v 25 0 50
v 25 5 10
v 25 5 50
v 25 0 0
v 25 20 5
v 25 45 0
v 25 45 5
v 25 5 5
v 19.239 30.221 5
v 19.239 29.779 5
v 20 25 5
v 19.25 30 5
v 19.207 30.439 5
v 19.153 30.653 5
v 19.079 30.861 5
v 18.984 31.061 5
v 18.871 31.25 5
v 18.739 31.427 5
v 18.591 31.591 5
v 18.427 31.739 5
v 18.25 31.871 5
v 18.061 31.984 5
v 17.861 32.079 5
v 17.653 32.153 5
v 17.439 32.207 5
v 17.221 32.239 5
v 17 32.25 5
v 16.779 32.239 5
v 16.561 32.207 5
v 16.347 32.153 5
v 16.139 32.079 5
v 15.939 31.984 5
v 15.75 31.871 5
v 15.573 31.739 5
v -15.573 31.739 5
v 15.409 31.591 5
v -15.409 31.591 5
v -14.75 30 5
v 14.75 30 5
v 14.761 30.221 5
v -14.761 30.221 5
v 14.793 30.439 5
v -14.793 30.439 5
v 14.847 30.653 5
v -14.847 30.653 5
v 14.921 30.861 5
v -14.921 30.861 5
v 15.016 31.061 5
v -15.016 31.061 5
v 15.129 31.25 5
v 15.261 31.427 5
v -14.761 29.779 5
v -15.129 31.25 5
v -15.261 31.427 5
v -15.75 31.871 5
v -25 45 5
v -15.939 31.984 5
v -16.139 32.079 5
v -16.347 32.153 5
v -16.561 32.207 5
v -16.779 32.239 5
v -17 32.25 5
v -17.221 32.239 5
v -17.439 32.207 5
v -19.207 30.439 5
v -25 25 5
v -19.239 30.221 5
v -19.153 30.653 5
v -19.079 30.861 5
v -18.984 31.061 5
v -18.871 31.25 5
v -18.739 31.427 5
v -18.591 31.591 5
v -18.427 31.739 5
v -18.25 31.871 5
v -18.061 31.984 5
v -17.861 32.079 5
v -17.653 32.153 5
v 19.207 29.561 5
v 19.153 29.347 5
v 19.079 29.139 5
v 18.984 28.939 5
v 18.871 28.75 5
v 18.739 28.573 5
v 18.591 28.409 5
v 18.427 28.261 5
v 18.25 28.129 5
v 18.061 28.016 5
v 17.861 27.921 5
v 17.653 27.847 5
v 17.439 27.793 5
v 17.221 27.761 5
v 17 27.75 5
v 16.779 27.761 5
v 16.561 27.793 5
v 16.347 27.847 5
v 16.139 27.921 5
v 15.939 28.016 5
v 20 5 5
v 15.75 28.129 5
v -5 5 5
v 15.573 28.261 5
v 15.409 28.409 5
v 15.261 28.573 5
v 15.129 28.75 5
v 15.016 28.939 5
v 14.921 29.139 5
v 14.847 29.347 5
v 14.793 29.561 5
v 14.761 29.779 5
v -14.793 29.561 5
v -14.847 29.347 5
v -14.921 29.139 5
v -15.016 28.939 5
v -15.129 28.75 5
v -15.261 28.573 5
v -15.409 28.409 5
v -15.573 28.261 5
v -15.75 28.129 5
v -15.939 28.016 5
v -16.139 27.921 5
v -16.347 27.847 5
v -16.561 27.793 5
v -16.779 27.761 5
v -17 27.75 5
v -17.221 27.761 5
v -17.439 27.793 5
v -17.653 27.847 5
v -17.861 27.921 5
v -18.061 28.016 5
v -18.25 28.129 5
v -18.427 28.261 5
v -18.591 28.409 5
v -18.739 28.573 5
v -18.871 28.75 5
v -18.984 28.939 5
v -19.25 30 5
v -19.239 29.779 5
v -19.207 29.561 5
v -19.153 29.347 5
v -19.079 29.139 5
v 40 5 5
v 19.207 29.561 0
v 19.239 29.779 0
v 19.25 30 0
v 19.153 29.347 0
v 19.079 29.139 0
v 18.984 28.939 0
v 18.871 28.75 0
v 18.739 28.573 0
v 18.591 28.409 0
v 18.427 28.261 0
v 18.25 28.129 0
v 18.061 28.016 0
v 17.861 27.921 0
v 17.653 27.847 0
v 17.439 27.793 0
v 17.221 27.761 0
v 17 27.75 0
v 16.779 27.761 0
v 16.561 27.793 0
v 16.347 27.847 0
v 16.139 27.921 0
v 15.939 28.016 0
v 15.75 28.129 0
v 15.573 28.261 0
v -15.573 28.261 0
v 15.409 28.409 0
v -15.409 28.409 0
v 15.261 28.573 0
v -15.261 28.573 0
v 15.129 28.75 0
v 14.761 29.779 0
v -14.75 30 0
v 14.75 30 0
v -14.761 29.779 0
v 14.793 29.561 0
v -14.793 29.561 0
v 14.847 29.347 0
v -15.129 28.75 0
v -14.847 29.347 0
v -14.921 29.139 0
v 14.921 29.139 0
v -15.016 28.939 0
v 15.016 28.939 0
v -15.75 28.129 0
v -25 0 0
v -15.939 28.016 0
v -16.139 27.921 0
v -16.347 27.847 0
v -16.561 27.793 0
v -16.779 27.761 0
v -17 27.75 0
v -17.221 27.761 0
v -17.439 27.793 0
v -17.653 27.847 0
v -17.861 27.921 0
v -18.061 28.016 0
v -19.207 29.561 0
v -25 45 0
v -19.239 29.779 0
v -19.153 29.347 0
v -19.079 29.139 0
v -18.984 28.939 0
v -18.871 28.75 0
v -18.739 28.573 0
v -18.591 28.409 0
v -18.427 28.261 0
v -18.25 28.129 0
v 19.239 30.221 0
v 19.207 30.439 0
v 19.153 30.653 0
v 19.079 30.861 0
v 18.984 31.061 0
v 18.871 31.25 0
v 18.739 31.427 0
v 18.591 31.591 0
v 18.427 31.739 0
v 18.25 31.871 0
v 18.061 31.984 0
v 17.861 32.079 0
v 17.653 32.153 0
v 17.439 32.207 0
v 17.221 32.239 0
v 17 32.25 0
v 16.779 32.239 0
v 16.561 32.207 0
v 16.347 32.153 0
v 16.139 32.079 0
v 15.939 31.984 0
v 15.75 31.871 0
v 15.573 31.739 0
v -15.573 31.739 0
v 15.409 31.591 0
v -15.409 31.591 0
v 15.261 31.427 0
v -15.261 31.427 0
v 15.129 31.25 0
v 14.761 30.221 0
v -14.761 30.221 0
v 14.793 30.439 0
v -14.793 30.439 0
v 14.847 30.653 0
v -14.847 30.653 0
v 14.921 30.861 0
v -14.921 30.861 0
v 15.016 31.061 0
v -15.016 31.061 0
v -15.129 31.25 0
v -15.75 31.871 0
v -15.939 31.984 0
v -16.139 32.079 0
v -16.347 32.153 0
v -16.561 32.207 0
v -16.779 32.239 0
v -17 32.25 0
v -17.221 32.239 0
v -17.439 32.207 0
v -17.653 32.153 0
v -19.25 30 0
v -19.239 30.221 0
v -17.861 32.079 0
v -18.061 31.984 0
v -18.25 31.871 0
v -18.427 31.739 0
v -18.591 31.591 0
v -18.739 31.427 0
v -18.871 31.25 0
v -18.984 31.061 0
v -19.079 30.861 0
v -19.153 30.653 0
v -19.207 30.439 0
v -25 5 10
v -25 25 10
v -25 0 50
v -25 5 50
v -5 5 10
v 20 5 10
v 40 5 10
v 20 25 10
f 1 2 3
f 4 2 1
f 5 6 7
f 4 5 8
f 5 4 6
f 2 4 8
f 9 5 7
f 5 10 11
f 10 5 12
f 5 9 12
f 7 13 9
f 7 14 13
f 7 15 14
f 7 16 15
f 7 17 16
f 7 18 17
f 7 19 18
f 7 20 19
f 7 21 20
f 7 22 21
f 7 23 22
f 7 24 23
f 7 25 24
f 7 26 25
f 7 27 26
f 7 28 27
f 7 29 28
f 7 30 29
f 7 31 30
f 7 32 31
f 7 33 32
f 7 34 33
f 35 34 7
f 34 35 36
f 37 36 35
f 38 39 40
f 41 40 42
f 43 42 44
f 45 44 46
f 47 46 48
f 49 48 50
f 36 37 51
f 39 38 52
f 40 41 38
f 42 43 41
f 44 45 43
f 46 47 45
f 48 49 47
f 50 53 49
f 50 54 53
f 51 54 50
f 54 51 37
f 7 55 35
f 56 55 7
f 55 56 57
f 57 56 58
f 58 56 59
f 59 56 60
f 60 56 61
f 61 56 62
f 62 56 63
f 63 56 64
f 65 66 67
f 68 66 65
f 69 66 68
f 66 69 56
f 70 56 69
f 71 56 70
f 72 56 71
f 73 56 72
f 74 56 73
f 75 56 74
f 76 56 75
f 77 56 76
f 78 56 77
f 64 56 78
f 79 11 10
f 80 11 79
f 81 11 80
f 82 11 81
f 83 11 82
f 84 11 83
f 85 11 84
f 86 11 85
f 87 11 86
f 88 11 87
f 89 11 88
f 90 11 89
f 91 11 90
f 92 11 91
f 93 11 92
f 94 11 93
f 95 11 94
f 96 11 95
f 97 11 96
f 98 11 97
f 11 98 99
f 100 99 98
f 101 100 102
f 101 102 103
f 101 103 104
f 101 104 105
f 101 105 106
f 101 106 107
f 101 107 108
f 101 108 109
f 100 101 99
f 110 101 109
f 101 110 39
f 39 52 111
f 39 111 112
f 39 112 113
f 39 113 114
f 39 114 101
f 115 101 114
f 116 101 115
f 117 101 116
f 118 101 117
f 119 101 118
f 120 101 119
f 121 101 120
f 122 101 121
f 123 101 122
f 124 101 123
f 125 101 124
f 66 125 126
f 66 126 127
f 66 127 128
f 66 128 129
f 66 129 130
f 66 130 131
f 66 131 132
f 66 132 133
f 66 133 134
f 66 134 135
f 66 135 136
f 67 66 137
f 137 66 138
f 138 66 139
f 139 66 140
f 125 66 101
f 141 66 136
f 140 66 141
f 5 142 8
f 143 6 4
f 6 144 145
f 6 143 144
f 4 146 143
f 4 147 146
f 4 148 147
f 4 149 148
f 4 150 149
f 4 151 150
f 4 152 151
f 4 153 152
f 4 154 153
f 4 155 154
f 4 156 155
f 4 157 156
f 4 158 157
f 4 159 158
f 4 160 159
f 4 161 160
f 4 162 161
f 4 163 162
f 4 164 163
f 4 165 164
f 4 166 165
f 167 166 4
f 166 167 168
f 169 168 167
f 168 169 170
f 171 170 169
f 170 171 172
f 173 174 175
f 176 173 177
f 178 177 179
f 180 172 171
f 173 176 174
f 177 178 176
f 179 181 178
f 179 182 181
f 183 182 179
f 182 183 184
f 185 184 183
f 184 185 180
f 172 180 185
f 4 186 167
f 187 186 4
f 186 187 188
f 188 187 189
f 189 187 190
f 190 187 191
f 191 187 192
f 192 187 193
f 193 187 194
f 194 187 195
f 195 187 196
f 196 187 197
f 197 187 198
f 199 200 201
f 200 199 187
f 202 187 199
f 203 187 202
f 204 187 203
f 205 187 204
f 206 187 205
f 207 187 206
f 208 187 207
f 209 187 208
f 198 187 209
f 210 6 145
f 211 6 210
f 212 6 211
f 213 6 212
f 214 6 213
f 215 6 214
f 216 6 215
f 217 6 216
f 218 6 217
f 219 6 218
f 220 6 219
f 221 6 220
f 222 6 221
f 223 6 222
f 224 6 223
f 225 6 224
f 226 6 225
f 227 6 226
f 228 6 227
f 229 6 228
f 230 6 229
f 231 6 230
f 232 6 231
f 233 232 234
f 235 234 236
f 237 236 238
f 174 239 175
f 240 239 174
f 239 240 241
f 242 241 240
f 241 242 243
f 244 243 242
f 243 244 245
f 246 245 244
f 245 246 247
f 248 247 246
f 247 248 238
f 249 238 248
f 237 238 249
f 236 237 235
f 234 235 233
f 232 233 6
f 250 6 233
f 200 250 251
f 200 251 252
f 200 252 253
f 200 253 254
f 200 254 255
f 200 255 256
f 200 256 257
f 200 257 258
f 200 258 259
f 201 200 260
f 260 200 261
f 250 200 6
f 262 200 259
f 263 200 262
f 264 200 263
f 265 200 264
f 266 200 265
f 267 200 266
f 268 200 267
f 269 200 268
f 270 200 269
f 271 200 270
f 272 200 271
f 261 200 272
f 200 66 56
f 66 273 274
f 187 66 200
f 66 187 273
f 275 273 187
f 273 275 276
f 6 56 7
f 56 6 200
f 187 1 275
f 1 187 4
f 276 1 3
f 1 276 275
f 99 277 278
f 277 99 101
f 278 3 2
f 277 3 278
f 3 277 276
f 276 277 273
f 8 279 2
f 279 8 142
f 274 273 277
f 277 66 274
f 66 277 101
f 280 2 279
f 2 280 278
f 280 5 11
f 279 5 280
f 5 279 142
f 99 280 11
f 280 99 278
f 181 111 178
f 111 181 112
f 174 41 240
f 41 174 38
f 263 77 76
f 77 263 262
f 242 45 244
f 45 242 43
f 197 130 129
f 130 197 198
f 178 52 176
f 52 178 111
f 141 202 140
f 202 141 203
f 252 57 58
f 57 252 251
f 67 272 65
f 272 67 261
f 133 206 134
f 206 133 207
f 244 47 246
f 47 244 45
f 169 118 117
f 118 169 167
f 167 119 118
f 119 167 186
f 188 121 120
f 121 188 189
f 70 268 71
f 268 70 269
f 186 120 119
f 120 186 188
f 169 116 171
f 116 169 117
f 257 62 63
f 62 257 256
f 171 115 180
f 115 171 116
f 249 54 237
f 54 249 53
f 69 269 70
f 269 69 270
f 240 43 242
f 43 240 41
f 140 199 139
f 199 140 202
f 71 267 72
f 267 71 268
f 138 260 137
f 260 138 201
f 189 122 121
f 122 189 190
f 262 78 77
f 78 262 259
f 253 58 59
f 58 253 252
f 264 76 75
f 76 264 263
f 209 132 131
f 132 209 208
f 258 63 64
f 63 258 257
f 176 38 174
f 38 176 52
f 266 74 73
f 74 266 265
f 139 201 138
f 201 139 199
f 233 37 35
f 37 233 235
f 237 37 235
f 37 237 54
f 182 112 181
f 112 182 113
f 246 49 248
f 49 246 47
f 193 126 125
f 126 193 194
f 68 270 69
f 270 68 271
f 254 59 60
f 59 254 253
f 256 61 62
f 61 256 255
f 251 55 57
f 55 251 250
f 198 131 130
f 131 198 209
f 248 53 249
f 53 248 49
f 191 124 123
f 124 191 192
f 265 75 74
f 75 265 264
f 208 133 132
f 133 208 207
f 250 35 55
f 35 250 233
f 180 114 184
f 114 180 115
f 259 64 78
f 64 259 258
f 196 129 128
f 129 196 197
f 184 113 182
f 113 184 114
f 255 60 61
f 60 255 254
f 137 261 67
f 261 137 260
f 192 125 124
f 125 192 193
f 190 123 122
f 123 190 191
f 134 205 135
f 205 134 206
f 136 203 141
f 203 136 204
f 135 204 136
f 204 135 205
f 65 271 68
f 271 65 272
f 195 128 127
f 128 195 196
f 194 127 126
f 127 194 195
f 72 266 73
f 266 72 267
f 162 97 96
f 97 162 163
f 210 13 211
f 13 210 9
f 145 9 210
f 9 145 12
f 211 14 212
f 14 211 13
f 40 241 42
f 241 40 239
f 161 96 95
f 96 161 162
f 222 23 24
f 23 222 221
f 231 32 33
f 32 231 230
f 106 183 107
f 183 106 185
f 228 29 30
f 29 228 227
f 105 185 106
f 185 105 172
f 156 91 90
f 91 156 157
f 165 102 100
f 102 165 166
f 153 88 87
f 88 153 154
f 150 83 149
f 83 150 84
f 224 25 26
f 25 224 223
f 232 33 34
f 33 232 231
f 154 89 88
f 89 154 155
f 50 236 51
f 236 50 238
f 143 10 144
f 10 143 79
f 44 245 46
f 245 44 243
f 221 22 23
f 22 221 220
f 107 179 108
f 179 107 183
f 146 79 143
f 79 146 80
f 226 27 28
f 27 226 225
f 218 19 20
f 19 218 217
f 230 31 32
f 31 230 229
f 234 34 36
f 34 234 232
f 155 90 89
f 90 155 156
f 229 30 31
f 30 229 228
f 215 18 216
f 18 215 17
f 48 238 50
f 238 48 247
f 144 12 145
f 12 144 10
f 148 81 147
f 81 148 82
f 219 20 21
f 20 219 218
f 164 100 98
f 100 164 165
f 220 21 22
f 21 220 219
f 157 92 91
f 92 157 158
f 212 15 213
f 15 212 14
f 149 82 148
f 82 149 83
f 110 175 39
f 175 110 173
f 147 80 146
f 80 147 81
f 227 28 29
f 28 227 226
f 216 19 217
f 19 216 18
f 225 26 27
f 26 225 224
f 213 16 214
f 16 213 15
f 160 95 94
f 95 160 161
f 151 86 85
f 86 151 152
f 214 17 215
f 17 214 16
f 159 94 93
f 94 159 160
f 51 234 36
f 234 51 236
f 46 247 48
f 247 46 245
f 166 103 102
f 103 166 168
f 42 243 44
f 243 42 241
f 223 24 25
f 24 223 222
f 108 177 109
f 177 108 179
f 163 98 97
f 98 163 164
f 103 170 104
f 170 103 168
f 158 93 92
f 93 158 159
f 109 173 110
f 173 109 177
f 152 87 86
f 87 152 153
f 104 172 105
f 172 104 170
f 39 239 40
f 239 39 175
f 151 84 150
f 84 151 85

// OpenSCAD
// NEMA 17 L-shaped mounting bracket
// Print orientation: base plate on bed (z=0), builds upward (+Z), centred on origin in X/Y.

$fn = 64;

// ---- Base plate ----
base_x_min = -25;   // left edge
base_x_max =  25;   // right edge
base_y_min =   0;   // back edge (shared with motor plate)
base_y_max =  45;   // front edge
base_z_min =   0;   // bed
base_z_max =   5;   // top of base plate

// ---- Motor plate ----
mp_x_min = -25;     // left edge
mp_x_max =  25;     // right edge
mp_y_min =   0;     // back edge (on bed)
mp_y_max =   5;     // front face
mp_z_min =   0;     // bed
mp_z_max =  50;     // top of motor plate

// ---- Motor centring-boss hole (through motor plate, axis along Y) ----
boss_d = 23;        // diameter
boss_cx =  0;       // centre x
boss_cz = 28;       // centre z

// ---- M3 screw holes (through motor plate, axis along Y) ----
m3_d = 3.4;         // diameter
m3_off = 31 / 2;    // 15.5 mm offset from boss centre (31 mm square pattern)

// ---- M4 base through-holes (axis along Z) ----
m4_d = 4.5;         // diameter
m4_x = 17;          // |x| of the two holes
m4_y = 30;          // y of the two holes

// ---- Triangular gussets (5 mm thick, flush with outer edges) ----
gusset_thk = 5;     // thickness in X
gusset_leg = 20;    // both legs (along +Y and +Z)
gusset_y0  =  5;    // right-angle corner y (front face of motor plate)
gusset_z0  =  5;    // right-angle corner z (top of base plate)

// ---- Base plate solid ----
module base() { translate([base_x_min, base_y_min, base_z_min])
    cube([base_x_max - base_x_min, base_y_max - base_y_min, base_z_max - base_z_min]); }

// ---- Motor plate solid ----
module motor_plate() { translate([mp_x_min, mp_y_min, mp_z_min])
    cube([mp_x_max - mp_x_min, mp_y_max - mp_y_min, mp_z_max - mp_z_min]); }

// ---- Gusset (right triangle in YZ, extruded in X) ----
// Right-angle corner at (y=5, z=5); legs go +Y and +Z.
module gusset() { linear_extrude(gusset_thk)
    polygon([[0, 0], [gusset_leg, 0], [0, gusset_leg]]); }

// ---- Cutters (each extends 1 mm past the faces it cuts) ----
// M4 vertical through-holes in base plate
m4_cut = [
    [-m4_x, m4_y],
    [ m4_x, m4_y]
];

// M3 screw holes in motor plate (31 mm square pattern centred on boss)
m3_cut = [
    [ boss_cx - m3_off, boss_cz - m3_off ],
    [ boss_cx + m3_off, boss_cz - m3_off ],
    [ boss_cx - m3_off, boss_cz + m3_off ],
    [ boss_cx + m3_off, boss_cz + m3_off ]
];

// ---- Final part ----
difference() {
    union() {
        base();
        motor_plate();
        // Left gusset: x from -25 to -20
        translate([mp_x_min, gusset_y0, gusset_z0]) gusset();
        // Right gusset: x from 20 to 25
        translate([mp_x_max - gusset_thk, gusset_y0, gusset_z0]) gusset();
    }

    // M4 holes (axis Z) – extend 1 mm above and below the base plate
    for (p = m4_cut)
        translate([p[0], p[1], base_z_min - 1])
            cylinder(h = (base_z_max - base_z_min) + 2, d = m4_d, $fn = $fn);

    // Boss hole (axis Y) – extend 1 mm past both faces of the motor plate
    translate([boss_cx, mp_y_min - 1, boss_cz])
        rotate([90, 0, 0])
            cylinder(h = (mp_y_max - mp_y_min) + 2, d = boss_d, $fn = $fn);

    // M3 holes (axis Y) – extend 1 mm past both faces of the motor plate
    for (p = m3_cut)
        translate([p[0], mp_y_min - 1, p[1]])
            rotate([90, 0, 0])
                cylinder(h = (mp_y_max - mp_y_min) + 2, d = m3_d, $fn = $fn);
}
